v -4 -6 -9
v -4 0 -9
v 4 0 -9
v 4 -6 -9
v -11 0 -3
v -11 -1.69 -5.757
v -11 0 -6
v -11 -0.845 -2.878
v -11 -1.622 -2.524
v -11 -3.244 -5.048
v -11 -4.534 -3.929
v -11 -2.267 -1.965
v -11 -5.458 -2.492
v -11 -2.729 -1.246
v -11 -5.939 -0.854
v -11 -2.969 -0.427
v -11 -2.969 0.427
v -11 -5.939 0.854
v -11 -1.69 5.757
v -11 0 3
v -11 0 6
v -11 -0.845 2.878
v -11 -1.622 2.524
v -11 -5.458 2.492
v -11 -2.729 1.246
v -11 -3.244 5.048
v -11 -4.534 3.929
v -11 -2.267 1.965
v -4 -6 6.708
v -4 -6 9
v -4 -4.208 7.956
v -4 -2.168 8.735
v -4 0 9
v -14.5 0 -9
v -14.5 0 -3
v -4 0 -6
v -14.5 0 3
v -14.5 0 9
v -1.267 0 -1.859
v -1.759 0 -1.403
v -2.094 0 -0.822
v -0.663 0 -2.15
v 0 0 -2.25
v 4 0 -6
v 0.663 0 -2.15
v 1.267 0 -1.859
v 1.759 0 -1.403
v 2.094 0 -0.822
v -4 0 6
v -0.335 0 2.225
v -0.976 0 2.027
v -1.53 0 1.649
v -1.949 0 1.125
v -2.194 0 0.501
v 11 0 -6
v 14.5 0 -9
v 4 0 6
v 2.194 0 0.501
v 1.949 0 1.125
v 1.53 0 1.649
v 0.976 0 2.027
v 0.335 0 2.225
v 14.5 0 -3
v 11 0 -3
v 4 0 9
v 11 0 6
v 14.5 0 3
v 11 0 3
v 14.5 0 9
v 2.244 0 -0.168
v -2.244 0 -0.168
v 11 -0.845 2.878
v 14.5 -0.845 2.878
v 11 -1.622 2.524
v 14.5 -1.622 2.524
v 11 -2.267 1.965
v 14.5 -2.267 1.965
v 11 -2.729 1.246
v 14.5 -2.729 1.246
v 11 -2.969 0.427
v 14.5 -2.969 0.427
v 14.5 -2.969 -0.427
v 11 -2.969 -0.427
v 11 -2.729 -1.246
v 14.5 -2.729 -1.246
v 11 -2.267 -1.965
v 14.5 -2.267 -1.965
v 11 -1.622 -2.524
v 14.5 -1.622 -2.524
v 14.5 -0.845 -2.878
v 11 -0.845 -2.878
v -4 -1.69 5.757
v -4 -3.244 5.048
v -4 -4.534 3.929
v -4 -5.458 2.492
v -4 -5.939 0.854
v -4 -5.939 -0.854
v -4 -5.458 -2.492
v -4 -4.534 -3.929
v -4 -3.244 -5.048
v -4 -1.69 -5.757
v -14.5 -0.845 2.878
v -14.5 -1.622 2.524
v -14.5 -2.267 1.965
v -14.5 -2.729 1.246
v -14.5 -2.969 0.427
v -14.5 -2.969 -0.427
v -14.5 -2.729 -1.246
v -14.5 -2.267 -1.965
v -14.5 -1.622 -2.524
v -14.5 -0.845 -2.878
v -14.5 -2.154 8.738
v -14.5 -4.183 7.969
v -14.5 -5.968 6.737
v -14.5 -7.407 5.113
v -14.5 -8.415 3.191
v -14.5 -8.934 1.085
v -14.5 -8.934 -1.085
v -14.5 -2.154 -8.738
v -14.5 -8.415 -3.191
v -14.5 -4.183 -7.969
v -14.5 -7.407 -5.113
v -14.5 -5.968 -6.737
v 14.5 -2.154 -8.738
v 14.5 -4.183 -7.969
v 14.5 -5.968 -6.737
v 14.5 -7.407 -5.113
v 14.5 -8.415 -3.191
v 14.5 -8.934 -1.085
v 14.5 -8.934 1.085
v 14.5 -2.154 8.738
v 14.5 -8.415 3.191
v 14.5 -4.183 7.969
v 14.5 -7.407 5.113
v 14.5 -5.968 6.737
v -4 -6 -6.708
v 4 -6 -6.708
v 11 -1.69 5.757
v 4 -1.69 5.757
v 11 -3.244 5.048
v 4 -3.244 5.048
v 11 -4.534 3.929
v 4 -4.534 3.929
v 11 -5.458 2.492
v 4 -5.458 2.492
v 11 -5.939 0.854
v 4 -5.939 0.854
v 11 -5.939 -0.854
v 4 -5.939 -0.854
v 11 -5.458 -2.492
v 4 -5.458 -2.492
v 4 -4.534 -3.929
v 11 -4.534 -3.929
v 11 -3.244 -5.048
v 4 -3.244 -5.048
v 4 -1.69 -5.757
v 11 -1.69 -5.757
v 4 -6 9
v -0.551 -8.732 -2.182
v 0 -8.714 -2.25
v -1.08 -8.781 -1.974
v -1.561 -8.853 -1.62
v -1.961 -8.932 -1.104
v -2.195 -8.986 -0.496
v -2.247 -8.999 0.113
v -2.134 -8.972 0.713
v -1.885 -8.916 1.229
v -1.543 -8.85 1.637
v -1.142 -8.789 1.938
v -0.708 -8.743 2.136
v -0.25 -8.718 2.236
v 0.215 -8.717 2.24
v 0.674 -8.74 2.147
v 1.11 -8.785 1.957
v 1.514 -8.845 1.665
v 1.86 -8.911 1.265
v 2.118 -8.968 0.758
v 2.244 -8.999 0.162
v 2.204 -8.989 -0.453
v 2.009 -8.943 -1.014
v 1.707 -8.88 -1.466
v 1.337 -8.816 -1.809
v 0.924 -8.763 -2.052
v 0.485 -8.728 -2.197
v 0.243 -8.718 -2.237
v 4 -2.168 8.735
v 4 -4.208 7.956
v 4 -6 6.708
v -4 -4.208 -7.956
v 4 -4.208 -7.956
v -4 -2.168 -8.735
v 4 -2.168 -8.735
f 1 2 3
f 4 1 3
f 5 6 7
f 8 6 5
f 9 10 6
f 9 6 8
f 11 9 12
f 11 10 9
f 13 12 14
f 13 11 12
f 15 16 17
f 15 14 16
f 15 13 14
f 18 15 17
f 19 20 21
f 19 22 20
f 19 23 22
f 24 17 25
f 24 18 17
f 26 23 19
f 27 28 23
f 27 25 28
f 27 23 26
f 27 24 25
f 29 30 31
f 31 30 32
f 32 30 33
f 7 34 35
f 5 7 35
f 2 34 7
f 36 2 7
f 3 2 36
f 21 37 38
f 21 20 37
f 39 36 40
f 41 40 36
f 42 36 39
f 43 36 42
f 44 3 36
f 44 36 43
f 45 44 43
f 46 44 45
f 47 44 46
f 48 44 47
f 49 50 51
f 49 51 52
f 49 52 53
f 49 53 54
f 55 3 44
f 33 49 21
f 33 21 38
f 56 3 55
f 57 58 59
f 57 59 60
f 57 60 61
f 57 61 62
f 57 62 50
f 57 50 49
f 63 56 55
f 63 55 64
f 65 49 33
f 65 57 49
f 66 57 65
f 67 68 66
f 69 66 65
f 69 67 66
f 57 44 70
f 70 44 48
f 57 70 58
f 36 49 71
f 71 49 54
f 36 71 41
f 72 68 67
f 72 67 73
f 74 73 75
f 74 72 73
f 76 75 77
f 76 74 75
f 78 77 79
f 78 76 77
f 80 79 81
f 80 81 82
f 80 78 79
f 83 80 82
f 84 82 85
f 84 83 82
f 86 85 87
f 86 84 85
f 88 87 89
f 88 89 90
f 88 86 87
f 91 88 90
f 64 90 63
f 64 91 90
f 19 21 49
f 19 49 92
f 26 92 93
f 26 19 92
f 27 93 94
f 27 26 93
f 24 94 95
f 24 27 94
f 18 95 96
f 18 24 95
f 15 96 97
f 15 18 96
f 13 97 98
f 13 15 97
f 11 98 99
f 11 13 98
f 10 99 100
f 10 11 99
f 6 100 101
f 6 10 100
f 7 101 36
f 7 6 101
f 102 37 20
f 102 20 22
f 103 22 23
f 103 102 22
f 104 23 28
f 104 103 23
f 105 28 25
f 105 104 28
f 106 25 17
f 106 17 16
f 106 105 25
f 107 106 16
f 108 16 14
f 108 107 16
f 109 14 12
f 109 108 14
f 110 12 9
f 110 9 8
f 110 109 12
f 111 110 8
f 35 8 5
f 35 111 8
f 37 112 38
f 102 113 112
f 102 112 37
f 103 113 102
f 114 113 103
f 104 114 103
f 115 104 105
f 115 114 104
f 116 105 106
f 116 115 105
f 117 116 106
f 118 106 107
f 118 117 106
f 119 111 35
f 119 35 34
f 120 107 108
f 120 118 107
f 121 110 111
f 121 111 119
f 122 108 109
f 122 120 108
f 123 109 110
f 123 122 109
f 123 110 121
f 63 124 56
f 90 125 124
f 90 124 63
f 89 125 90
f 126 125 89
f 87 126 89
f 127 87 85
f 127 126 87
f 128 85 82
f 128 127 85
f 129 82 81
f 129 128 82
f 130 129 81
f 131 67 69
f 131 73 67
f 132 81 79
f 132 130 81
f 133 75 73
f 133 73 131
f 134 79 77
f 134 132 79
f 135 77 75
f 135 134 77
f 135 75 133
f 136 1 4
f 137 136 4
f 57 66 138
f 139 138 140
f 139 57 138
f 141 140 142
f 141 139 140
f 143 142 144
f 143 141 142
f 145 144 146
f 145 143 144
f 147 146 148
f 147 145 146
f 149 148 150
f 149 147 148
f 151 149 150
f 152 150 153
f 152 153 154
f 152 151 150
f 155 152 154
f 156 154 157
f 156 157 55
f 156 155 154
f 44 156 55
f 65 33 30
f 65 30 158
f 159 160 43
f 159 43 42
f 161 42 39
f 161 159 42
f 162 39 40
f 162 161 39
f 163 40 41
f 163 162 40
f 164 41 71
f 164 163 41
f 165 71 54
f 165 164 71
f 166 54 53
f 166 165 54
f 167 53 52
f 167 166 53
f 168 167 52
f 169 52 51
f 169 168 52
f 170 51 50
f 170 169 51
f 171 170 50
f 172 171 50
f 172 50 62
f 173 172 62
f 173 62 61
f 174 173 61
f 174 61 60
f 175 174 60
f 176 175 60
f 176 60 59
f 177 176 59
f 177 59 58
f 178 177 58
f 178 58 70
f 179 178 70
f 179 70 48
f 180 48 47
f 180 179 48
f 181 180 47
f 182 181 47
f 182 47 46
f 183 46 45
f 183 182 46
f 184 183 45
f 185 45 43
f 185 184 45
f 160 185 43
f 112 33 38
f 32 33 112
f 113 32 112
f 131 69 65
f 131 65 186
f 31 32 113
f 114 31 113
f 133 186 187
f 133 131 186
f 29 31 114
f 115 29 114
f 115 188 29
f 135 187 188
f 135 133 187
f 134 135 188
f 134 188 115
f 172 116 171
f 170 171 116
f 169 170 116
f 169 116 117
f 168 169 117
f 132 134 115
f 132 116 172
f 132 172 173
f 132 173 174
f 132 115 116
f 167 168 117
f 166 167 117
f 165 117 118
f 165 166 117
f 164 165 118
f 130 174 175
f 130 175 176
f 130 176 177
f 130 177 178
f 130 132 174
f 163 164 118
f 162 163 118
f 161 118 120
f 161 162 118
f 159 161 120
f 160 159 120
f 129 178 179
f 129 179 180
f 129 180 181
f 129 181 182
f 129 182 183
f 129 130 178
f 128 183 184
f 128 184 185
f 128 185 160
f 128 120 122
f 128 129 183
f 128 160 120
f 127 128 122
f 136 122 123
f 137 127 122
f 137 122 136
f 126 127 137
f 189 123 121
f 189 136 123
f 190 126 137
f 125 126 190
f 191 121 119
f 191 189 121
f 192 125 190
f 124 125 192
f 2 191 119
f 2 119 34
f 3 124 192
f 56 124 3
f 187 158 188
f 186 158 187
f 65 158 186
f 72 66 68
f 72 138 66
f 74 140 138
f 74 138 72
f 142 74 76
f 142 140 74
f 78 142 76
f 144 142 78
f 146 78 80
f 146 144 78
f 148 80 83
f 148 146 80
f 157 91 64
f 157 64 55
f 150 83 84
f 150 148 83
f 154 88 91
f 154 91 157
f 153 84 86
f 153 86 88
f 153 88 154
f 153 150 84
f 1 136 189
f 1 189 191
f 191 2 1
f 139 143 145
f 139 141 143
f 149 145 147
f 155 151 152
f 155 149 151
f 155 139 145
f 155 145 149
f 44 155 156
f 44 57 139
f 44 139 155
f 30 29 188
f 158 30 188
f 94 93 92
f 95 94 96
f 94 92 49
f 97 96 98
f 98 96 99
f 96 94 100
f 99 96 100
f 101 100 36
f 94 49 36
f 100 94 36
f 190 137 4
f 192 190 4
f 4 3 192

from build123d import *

# Parameters (mm, degrees)
CUT_EXTRUDE1_DEPTH      = 10
CUT_EXTRUDE1_DEPTH_BACK = 10
SKETCH4_R               = 2.25
SKETCH4_3_W             = 8
SKETCH4_3_H             = 18
SKETCH4_3_R             = 2.25
BOSS_EXTRUDE1_DEPTH     = 6
CUT_EXTRUDE2_DEPTH      = 32.670175393
CUT_EXTRUDE2_DEPTH_BACK = 32.670175393


with BuildPart() as part:
    # Sketch1 → Revolve1 (revolve)
    with BuildSketch(Plane.XY):
        Polygon((-14.5, 9), (14.5, 9), (14.5, 3), (11, 3), (11, 6), (-11, 6), (-11, 3), (-14.5, 3), align=None)
    revolve(axis=Axis((-39.087837838, 0, 0), (1, 0, 0)))

    # Sketch4 → Cut-Extrude1 (cut, two sides: drawn at the far end of the back side and taken through both)
    with BuildSketch(Plane(origin=(0, 0, 0), x_dir=(1, 0, 0), z_dir=(0, 1, 0)).offset(-CUT_EXTRUDE1_DEPTH_BACK)):
        Circle(SKETCH4_R)
    extrude(amount=CUT_EXTRUDE1_DEPTH + CUT_EXTRUDE1_DEPTH_BACK, mode=Mode.SUBTRACT)

    # Sketch4<3> → Boss-Extrude1 (add, symmetric)
    with BuildSketch(Plane(origin=(0, 0, 0), x_dir=(1, 0, 0), z_dir=(0, 1, 0))):
        Rectangle(SKETCH4_3_W, SKETCH4_3_H)
        Circle(SKETCH4_3_R, mode=Mode.SUBTRACT)
    extrude(amount=BOSS_EXTRUDE1_DEPTH, both=True)

    # Sketch5 → Cut-Extrude2 (cut, two sides: drawn at the far end of the back side and taken through both)
    with BuildSketch(Plane.ZY.offset(14.5).offset(-CUT_EXTRUDE2_DEPTH_BACK)):
        Polygon((-61.985560784, 0), (-9.284472497, 0), (10.360933076, 0), (63.062021364, 0), (63.062021364, 105.402176576), (-61.985560784, 105.402176576), align=None)
    extrude(amount=CUT_EXTRUDE2_DEPTH + CUT_EXTRUDE2_DEPTH_BACK, mode=Mode.SUBTRACT)


solid = part.part
